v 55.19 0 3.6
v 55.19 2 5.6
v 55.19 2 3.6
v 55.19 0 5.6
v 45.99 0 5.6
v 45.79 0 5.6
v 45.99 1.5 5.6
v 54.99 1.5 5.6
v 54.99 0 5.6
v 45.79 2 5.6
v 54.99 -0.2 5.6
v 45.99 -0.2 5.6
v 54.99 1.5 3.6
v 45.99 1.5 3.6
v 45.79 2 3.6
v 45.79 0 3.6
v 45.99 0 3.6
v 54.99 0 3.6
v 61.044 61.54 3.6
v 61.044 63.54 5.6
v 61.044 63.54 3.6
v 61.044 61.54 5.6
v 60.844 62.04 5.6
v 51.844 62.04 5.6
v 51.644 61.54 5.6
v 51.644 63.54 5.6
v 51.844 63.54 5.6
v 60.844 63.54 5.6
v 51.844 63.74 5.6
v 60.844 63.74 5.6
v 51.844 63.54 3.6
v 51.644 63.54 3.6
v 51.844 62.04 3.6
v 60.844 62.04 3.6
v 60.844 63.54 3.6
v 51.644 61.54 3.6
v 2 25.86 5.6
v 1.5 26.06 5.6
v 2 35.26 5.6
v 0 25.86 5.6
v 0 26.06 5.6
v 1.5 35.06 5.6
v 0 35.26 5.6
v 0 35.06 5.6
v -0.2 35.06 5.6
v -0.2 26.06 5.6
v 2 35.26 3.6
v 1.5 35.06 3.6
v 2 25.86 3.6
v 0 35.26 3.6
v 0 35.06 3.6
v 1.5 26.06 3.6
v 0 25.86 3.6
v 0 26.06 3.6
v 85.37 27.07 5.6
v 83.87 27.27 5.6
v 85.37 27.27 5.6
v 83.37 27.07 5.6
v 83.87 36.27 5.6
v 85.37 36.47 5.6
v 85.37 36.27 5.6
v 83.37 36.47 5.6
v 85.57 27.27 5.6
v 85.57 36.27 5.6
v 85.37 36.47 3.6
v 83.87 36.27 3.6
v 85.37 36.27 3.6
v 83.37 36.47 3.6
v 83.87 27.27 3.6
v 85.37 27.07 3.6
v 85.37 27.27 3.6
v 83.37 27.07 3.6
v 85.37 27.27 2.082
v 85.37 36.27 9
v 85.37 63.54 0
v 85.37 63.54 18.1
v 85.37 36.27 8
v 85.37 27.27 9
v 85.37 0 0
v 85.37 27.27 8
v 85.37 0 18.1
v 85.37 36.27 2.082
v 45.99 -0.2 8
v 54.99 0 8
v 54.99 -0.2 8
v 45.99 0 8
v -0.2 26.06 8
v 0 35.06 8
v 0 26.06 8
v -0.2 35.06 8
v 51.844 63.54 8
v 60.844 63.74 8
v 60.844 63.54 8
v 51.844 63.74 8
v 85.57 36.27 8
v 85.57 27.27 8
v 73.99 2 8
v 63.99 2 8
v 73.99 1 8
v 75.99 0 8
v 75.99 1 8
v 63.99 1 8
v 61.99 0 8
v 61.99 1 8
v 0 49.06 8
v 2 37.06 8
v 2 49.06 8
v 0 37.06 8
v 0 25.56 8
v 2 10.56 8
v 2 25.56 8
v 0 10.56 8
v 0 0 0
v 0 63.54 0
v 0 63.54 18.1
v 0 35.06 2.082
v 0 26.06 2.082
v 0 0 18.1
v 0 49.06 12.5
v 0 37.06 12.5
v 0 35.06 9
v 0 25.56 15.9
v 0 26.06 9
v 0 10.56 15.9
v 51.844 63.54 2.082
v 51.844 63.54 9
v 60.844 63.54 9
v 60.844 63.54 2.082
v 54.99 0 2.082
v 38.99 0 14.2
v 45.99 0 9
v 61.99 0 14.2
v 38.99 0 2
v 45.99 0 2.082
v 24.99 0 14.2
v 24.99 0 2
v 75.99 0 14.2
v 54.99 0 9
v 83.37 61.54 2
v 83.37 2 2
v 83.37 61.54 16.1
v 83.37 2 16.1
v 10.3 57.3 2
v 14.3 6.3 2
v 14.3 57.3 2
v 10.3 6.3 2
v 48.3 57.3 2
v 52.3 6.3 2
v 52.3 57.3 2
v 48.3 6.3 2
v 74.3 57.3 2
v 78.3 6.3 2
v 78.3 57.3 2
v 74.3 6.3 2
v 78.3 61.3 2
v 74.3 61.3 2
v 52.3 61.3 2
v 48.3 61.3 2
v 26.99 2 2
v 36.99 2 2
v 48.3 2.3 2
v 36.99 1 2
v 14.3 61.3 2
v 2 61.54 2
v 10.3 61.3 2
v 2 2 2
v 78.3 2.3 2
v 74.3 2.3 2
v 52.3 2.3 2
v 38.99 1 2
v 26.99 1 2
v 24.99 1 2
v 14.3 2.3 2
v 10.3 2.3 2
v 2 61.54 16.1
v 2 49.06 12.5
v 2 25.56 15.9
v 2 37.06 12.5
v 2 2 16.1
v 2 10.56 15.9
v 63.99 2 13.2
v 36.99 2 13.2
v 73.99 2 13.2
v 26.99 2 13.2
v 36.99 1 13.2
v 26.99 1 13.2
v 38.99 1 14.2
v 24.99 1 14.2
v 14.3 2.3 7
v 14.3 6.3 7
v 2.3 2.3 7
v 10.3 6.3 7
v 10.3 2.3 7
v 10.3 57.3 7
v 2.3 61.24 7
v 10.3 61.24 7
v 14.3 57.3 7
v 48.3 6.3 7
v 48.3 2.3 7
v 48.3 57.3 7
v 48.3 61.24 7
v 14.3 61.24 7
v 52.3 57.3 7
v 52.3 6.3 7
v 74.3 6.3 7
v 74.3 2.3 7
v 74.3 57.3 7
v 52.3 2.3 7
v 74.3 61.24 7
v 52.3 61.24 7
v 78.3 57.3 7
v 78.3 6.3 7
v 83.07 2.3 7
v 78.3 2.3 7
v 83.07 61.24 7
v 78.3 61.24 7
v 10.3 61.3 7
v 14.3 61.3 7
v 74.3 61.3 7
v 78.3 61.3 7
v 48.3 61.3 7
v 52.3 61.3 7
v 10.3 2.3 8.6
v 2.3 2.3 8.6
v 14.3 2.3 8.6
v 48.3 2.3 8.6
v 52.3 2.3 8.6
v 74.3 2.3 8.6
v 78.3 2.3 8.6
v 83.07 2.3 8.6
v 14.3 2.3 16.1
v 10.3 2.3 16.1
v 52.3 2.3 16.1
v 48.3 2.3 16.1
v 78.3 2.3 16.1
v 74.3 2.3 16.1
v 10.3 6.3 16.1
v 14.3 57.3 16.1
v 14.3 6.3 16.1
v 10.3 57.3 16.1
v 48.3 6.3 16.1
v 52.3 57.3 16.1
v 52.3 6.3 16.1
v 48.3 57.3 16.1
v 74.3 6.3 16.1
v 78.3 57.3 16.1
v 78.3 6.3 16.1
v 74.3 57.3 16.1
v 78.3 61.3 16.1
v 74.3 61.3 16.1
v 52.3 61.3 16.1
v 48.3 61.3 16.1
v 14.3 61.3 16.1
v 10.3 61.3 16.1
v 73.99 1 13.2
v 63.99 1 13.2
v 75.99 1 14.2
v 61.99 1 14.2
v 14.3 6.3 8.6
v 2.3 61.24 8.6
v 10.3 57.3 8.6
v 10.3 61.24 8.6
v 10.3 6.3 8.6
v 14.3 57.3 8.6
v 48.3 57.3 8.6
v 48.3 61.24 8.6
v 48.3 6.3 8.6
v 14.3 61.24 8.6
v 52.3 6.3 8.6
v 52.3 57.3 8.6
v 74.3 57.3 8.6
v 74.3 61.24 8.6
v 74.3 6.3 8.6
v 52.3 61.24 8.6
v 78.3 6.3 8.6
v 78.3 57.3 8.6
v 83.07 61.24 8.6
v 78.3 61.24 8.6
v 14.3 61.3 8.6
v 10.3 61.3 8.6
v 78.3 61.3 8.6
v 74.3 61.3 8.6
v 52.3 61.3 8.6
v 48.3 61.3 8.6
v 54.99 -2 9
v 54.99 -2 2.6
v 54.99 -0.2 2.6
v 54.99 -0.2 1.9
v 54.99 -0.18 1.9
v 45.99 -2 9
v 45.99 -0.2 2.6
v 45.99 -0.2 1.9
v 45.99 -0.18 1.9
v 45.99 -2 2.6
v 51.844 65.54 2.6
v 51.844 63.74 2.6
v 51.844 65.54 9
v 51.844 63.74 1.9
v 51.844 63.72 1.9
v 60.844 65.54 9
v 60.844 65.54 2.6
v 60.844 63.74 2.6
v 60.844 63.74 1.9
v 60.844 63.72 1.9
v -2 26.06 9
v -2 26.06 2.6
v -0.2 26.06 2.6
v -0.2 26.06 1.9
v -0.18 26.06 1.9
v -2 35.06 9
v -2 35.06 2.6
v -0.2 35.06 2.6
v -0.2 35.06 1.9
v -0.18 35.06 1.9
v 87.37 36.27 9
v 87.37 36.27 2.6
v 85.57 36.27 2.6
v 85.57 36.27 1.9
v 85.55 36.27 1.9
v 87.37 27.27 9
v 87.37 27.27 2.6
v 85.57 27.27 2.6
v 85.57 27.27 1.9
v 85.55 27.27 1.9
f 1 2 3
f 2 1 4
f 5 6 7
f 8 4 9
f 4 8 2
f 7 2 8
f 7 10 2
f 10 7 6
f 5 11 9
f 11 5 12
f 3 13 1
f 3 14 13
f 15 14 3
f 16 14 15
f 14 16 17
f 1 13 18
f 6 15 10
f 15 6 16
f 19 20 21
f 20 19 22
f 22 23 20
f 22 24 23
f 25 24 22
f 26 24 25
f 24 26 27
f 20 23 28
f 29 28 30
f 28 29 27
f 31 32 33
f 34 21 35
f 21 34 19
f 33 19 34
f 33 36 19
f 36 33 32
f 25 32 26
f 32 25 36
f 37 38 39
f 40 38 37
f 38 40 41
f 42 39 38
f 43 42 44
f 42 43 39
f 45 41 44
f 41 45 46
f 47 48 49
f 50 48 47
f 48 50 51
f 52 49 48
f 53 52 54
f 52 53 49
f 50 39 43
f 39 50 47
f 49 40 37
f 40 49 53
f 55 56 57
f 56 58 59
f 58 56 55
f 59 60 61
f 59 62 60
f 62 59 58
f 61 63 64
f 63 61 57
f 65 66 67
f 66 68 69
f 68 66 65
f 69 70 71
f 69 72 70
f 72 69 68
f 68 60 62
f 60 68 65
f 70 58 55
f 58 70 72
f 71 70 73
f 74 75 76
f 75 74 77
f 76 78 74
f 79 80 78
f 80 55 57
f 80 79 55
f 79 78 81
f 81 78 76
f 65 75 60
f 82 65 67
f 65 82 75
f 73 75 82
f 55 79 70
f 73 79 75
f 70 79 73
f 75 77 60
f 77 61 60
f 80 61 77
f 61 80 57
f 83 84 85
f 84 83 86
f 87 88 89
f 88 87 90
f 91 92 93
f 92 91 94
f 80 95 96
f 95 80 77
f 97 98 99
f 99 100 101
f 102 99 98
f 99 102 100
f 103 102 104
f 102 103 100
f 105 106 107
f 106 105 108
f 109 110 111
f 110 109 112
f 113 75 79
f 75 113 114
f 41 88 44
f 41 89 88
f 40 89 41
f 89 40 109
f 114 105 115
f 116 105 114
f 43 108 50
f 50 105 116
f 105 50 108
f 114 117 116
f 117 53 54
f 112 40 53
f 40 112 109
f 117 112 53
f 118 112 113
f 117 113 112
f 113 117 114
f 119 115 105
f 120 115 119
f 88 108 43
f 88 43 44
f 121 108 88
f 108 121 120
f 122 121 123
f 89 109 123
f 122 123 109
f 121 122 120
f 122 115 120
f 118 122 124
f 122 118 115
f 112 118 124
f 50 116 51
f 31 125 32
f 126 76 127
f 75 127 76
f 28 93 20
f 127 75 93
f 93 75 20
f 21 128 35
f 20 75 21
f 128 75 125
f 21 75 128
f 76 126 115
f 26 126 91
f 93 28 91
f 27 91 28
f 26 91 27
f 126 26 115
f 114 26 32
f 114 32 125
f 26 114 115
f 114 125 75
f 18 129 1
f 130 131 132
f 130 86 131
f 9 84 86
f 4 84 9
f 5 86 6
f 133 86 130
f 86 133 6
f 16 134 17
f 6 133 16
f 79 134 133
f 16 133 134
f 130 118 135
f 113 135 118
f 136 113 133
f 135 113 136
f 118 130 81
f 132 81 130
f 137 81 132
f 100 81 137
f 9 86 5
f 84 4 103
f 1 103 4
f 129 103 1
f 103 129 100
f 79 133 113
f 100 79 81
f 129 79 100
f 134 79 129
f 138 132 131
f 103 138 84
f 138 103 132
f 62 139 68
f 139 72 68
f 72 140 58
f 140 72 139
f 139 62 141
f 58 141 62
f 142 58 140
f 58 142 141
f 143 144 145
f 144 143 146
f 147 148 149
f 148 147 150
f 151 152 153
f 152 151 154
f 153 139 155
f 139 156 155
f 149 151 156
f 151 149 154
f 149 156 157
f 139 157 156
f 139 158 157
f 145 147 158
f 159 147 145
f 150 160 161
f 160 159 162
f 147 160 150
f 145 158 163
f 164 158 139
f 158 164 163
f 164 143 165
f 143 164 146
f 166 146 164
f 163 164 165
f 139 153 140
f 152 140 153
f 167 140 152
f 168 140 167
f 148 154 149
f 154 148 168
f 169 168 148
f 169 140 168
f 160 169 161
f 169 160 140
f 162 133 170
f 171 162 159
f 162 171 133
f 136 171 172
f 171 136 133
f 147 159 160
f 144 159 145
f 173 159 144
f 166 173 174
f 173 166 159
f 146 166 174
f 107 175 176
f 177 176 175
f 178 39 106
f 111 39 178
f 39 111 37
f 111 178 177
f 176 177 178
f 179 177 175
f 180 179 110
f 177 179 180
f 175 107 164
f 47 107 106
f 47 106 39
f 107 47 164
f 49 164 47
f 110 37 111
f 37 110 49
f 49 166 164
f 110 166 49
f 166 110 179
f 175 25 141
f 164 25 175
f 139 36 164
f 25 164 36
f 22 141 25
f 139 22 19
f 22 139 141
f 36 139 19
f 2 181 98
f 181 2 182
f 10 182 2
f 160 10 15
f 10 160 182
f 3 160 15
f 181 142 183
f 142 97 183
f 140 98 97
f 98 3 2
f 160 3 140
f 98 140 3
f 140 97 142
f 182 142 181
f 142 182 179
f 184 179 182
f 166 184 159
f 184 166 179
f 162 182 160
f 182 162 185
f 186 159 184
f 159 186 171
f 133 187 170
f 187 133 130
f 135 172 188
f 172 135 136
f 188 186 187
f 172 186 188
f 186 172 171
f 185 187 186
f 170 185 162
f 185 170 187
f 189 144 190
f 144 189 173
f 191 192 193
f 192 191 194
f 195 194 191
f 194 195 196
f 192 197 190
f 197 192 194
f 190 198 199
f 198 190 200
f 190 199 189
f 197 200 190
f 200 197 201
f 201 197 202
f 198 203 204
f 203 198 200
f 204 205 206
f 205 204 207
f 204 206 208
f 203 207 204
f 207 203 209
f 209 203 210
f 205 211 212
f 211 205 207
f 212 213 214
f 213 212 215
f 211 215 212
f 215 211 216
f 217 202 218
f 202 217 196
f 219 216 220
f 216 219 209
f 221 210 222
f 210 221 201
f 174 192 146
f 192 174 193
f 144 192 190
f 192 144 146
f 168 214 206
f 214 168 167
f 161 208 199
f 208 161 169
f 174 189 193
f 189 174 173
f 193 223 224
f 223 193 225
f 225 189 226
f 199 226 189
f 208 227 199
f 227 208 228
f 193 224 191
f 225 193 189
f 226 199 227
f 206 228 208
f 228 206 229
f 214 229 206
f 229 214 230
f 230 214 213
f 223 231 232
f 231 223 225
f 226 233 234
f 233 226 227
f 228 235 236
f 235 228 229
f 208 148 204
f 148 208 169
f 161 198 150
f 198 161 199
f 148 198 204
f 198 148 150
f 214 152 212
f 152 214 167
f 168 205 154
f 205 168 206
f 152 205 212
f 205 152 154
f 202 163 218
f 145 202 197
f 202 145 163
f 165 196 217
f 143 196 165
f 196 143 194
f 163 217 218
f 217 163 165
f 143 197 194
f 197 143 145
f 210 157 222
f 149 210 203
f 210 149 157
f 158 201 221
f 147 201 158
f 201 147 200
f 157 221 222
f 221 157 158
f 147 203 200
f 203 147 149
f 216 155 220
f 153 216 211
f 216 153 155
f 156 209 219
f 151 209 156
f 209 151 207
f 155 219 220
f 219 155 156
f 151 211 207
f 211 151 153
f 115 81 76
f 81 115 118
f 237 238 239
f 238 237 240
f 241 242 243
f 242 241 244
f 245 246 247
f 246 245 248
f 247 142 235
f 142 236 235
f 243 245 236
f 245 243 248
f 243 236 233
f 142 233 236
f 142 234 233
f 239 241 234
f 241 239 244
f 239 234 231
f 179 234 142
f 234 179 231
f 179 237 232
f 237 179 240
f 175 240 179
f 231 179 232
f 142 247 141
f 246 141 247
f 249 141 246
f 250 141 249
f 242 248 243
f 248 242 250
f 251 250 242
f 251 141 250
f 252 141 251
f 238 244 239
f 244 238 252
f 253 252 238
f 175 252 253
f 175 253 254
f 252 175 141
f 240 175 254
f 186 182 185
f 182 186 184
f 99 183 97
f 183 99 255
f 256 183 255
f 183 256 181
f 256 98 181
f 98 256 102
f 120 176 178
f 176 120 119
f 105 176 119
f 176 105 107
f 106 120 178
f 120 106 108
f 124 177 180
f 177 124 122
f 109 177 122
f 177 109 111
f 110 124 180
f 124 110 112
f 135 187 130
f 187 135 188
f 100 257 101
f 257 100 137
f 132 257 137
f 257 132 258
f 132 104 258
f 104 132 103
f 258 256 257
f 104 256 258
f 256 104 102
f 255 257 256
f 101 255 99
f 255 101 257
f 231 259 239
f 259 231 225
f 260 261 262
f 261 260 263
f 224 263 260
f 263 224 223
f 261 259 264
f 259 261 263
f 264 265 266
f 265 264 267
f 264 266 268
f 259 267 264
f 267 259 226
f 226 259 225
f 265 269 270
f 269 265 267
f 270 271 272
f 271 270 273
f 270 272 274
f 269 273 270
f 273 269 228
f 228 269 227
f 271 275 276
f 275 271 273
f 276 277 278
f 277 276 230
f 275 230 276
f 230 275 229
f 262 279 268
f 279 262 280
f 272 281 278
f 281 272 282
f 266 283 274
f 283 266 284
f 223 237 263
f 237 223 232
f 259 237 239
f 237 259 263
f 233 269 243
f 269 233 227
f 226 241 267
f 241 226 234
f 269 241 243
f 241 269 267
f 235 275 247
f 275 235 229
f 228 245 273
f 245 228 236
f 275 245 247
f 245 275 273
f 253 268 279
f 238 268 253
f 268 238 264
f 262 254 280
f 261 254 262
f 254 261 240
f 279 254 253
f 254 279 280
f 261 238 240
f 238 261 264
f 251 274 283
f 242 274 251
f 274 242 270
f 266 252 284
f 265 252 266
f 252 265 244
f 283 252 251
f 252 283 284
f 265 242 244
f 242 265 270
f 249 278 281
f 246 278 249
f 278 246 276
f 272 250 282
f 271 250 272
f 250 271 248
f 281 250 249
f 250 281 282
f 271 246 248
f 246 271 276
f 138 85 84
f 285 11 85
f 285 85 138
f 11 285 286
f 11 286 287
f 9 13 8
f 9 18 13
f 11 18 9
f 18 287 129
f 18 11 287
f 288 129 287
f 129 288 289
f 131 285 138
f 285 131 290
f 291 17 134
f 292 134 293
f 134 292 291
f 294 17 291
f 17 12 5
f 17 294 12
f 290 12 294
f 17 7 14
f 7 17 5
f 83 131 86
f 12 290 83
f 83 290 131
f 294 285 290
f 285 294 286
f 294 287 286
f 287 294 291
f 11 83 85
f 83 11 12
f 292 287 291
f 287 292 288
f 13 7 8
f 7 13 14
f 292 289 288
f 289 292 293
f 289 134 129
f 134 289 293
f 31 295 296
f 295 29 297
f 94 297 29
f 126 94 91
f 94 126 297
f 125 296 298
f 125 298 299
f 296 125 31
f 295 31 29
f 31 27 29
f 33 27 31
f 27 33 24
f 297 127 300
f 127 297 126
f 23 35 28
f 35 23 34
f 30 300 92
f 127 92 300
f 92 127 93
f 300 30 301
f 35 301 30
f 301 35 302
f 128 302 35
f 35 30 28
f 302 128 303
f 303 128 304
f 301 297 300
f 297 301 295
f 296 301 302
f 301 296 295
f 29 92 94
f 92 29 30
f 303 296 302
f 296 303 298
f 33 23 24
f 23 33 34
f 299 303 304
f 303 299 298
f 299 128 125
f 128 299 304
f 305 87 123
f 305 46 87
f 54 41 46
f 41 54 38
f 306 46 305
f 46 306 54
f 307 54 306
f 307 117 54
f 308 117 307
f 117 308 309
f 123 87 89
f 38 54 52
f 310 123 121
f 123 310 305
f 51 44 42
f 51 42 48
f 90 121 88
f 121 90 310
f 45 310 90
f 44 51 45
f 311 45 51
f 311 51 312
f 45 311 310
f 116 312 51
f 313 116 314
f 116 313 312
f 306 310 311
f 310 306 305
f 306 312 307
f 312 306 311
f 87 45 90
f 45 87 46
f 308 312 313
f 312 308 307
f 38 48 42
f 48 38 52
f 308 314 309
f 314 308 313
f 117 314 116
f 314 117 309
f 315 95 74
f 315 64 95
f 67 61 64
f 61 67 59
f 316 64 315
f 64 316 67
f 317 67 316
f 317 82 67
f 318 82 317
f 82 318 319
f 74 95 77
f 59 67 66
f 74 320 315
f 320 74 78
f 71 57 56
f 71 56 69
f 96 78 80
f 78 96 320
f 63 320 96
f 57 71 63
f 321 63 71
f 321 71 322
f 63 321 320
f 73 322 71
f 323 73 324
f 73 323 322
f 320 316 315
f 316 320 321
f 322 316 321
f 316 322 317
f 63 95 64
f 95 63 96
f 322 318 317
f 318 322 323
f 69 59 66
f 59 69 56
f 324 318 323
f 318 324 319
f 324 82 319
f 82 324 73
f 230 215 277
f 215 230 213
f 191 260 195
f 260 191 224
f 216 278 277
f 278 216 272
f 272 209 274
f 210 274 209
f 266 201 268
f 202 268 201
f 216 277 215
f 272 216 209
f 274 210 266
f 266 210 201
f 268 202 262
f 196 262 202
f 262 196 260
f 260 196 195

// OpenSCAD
// Screen Hopper - two-part 3D-printed enclosure for the "compact" triple-Pico board.
//
// Geometry is taken directly from hardware/compact/screen-hopper-compact.kicad_pcb:
//   board outline 80.77 x 58.94 mm (plain rectangle), 1.6 mm thick, no mounting holes.
//   Connectors (board-local, origin at the board's min corner = kicad (2.31, 0.24)).
//   All three Pico micro-USBs are on the SAME edge (front, Y-min); A2 is mounted on
//   the underside directly beneath A1, so its connector sits below the board on that
//   same front edge (verified against a kicad-cli render of both board sides):
//     A1 micro-USB  front edge (Y-min)  X = 29.69   TOP side    (above board)
//     A2 micro-USB  front edge (Y-min)  X = 29.69   BOTTOM side (below board, under A1)
//     A3 micro-USB  front edge (Y-min)  X = 66.69   TOP side    (above board)
//     J2 USB-C      left  edge (X-min)  Y = 40.76   top side
//     J1 USB-A      left  edge (X-min)  Y = 15.76   top side
//   The Pico USB mouths sit ~2 mm inside the board edge, so cutouts are sized for the
//   plug shell to reach through the wall+recess tunnel.
//
// Because A2 hangs below the board, the board drops into the base vertically. Split is
// at ~board-top: the BASE is a shallow tray that holds the board on risers and carries
// A2's (bottom-side) cutout; the LID is a tall cover carrying the four top-side
// connector cutouts and clamping the board onto the risers. On the front wall the A1
// (lid) and A2 (base) openings stack either side of the seam at X = 29.69.
//
// Render a single part for printing:
//   openscad -D 'part="base"' -o base.stl screen-hopper-enclosure.scad
//   openscad -D 'part="lid"'  -o lid.stl  screen-hopper-enclosure.scad
// part="both" (default) shows the assembly; part="exploded" separates the halves.

part = "both";          // "base" | "lid" | "both" | "exploded"

$fn = 64;
eps = 0.02;

/* ---------------- fit / wall parameters (mm) ---------------- */
clr        = 0.2;       // print fit clearance (snap engagement, lid register)
board_clr  = 0.3;       // XY gap around the PCB inside the cavity
wall       = 2.0;       // side-wall thickness
floor_th   = 2.0;       // base floor thickness
top_th     = 2.0;       // lid top thickness

/* ---------------- board ---------------- */
bw = 80.77;             // board width  (X)
bd = 58.94;             // board depth  (Y)
bth = 1.6;              // board thickness

/* ---------------- vertical stack (Z measured from base outer bottom) ---------------- */
bottom_gap = 5.0;       // PCB bottom above base inner floor - clears A2 underside (~3.6)
top_gap    = 7.5;       // PCB top to lid inner ceiling - clears USB-A shell (6.5) + margin

board_bot = floor_th + bottom_gap;     // 7.0
board_top = board_bot + bth;           // 8.6
seam      = board_top - 0.6;           // 8.0  base-wall top / lid joint
ceil_in   = board_top + top_gap;       // 16.1 lid inner ceiling
outer_h   = ceil_in + top_th;          // 18.1 overall outer height

/* ---------------- XY footprint ---------------- */
cav_w = bw + 2*board_clr;
cav_d = bd + 2*board_clr;
outer_w = cav_w + 2*wall;
outer_d = cav_d + 2*wall;

bx0 = wall + board_clr;     // PCB min corner in part coords (2.3, 2.3)
by0 = wall + board_clr;

/* connector centres in part coords (board-local + board origin) */
A1x = bx0 + (32.00 - 2.31);
A3x = bx0 + (69.00 - 2.31);
A2x = bx0 + (32.00 - 2.31);
J2y = by0 + (41.00 - 0.24);
J1y = by0 + (16.00 - 0.24);

/* connector aperture sizes [width-along-wall], generous so the plug shell clears the
   wall+recess tunnel (mouths are ~2 mm inside the board edge) */
mUSB_w = 10.0;          // micro-USB through-cut (plug nose/shell)
usbc_w = 12.0;          // USB-C
usba_w = 15.0;          // USB-A

/* micro-USB ports are recessed ~2.4 mm behind the board edge. To let the plug seat,
   the front wall is thinned to `thin_wall` over a pocket around each micro-USB cutout,
   giving the overmould a lead-in and the metal plug more reach into the socket. */
thin_wall  = 1.0;
mUSB_pkt_w = 14.0;      // pocket width (overmould lead-in)
mUSB_pkt_h = 8.0;       // pocket height

/* connector Z spans (absolute), open toward the seam so parts assemble vertically */
// A2 (bottom side, base FRONT wall): centre ~ board_bot-2.3=4.7, open up to seam.
A2_z0 = floor_th;  A2_z1 = seam + eps;
// top-side (lid walls): open down to the seam, up to just over each connector top.
mUSB_z1 = 13.2;         // A1/A3 micro-USB top (board_top+1.0 pico +2.6 conn +margin)
usbc_z1 = 12.5;         // USB-C top (board_top + 3.26 + margin)
usba_z1 = 15.9;         // USB-A top (board_top + 6.5 + margin)

/* ---------------- support / clamp posts (bare-FR4 spots, clear top & bottom) ----------------
   board-local XY; risers sit under them (z floor..board_bot), lid ribs above (board_top..ceil). */
post_xy = [[10,2],[48,2],[74,2],[10,57],[48,57],[74,57]];
post = 4.0;             // square post side

/* ---------------- snap clips ----------------
   {face, pos} on connector-free wall spots. Cantilever arm on the lid hooks a window
   in the base wall. */
snap_w   = 9.0;         // clip width
arm_t    = 1.8;         // cantilever arm thickness
barb     = 1.5;         // barb engagement depth
win_z0   = 3.6;         // base window bottom
win_z1   = 5.6;         // base window top (barb hooks under this edge)
arm_gap  = clr;         // gap between arm inner face and base wall outer face

snaps = [
  ["front", (A1x+A3x)/2],
  ["back",  outer_w*0.66],
  ["left",  (J1y+J2y)/2],
  ["right", outer_d/2],
];

/* ==================================================================== */
/* helpers                                                              */
/* ==================================================================== */

// Cut a rectangular aperture through one wall, between z0 and z1.
module wall_cut(face, pos, width, z0, z1) {
  d = wall + 2;  h = z1 - z0;
  if (face == "front")
    translate([pos - width/2, -1,           z0]) cube([width, d, h]);
  else if (face == "back")
    translate([pos - width/2, outer_d-d+1,  z0]) cube([width, d, h]);
  else if (face == "left")
    translate([-1,           pos - width/2, z0]) cube([d, width, h]);
  else if (face == "right")
    translate([outer_w-d+1,  pos - width/2, z0]) cube([d, width, h]);
}

// Thin a wall to `thin_wall` over a pocket (removes the OUTER face material), giving a
// recessed connector port a lead-in. Leaves `thin_wall` of material on the inner side.
module wall_pocket(face, pos, width, z0, z1) {
  rd = wall - thin_wall + 1;  h = z1 - z0;          // outer depth removed (+1 overrun)
  if (face == "front")
    translate([pos - width/2, -1, z0]) cube([width, rd, h]);
  else if (face == "back")
    translate([pos - width/2, outer_d - rd + 1, z0]) cube([width, rd, h]);
  else if (face == "left")
    translate([-1, pos - width/2, z0]) cube([rd, width, h]);
  else if (face == "right")
    translate([outer_w - rd + 1, pos - width/2, z0]) cube([rd, width, h]);
}

/* ==================================================================== */
/* BASE                                                                 */
/* ==================================================================== */
module base() {
  difference() {
    union() {
      // outer shell up to the seam
      cube([outer_w, outer_d, seam]);
    }
    // hollow cavity (above the floor, inside the walls), open at the top
    translate([wall, wall, floor_th])
      cube([cav_w, cav_d, seam - floor_th + eps]);
    // A2 connector aperture (FRONT wall, bottom side, under A1), open to seam so the
    // board drops in. Stacks below A1's lid opening at the same X.
    wall_cut("front", A2x, mUSB_w, A2_z0, A2_z1);
    wall_pocket("front", A2x, mUSB_pkt_w, floor_th, seam);   // recess lead-in for A2
    // snap windows
    for (s = snaps) snap_window(s[0], s[1]);
  }
  // risers the PCB rests on
  for (p = post_xy)
    translate([bx0 + p[0] - post/2, by0 + p[1] - post/2, floor_th])
      cube([post, post, bottom_gap]);
}

// rectangular through-window in the base wall for a snap barb (clearance each side)
module snap_window(face, pos) {
  wall_cut(face, pos, snap_w + 2*clr, win_z0, win_z1);
}

/* ==================================================================== */
/* LID                                                                  */
/* ==================================================================== */
module lid() {
  difference() {
    union() {
      // top plate
      translate([0, 0, ceil_in]) cube([outer_w, outer_d, top_th]);
      // side walls from seam up to the ceiling
      difference() {
        cube([outer_w, outer_d, ceil_in + eps]);
        translate([wall, wall, -1]) cube([cav_w, cav_d, ceil_in + 2]);
        // remove everything below the seam (that volume belongs to the base)
        translate([-1, -1, -1]) cube([outer_w+2, outer_d+2, seam + 1]);
      }
    }
    // top-side connector apertures (open at the seam = lid wall bottom)
    wall_cut("front", A1x, mUSB_w, seam - eps, mUSB_z1);   // A1 micro-USB
    wall_cut("front", A3x, mUSB_w, seam - eps, mUSB_z1);   // A3 micro-USB
    wall_cut("left",  J2y, usbc_w, seam - eps, usbc_z1);   // J2 USB-C
    wall_cut("left",  J1y, usba_w, seam - eps, usba_z1);   // J1 USB-A
    // recess lead-ins for the (recessed) micro-USB ports
    wall_pocket("front", A1x, mUSB_pkt_w, seam, mUSB_z1 + 1);
    wall_pocket("front", A3x, mUSB_pkt_w, seam, mUSB_z1 + 1);
  }
  // clamp ribs press the PCB top onto the risers
  for (p = post_xy)
    translate([bx0 + p[0] - post/2, by0 + p[1] - post/2, board_top])
      cube([post, post, ceil_in - board_top]);
  // snap arms
  for (s = snaps) snap_arm(s[0], s[1]);
}

// Cantilever snap arm hanging from the lid, hooking a window in the base wall.
// Built in a canonical frame (wall outer face at Y=0, hanging in -Y, centred at X=0)
// then rotated/translated onto the requested face.
module snap_arm(face, pos) {
  if (face == "front")      translate([pos, 0,       0])               snap_arm_canon();
  else if (face == "back")  translate([pos, outer_d, 0]) rotate([0,0,180]) snap_arm_canon();
  else if (face == "left")  translate([0,   pos,     0]) rotate([0,0,-90]) snap_arm_canon();
  else if (face == "right") translate([outer_w, pos, 0]) rotate([0,0,90])  snap_arm_canon();
}

// Canonical arm: outer wall face at Y=0, material inward (+Y), arm hangs in -Y.
module snap_arm_canon() {
  arm_top = seam + 1.0;          // anchored slightly up into the lid wall
  arm_bot = win_z0 - 1.0;        // reaches below the window
  arm_h   = arm_top - arm_bot;
  // anchor: fuses the arm root to the lid wall over the seam..arm_top band
  translate([-snap_w/2, -(arm_gap + arm_t), seam])
    cube([snap_w, arm_gap + arm_t + 0.8, arm_top - seam]);
  // flexing slab, just outside the wall
  translate([-snap_w/2, -(arm_gap + arm_t), arm_bot])
    cube([snap_w, arm_t, arm_h]);
  // barb hook: from the arm inward into the window, hooking under its top edge
  translate([-snap_w/2, -arm_gap, win_z0])
    cube([snap_w, arm_gap + barb, win_z1 - win_z0]);
  // lead-in ramp under the barb (cams the arm outward during assembly)
  hull() {
    translate([-snap_w/2, -arm_gap, win_z0]) cube([snap_w, arm_gap + barb, eps]);
    translate([-snap_w/2, -arm_gap, win_z0 - (arm_gap + barb)]) cube([snap_w, eps, eps]);
  }
}

/* ==================================================================== */
/* assembly                                                             */
/* ==================================================================== */
module board_ghost() {
  color([0.1,0.5,0.2,0.35])
    translate([bx0, by0, board_bot]) cube([bw, bd, bth]);
}

if (part == "base") base();
else if (part == "lid") lid();
else if (part == "exploded") {
  base();
  board_ghost();
  translate([0, 0, 30]) lid();
} else {
  base();
  board_ghost();
  color([0.7,0.7,0.75,0.55]) lid();
}
